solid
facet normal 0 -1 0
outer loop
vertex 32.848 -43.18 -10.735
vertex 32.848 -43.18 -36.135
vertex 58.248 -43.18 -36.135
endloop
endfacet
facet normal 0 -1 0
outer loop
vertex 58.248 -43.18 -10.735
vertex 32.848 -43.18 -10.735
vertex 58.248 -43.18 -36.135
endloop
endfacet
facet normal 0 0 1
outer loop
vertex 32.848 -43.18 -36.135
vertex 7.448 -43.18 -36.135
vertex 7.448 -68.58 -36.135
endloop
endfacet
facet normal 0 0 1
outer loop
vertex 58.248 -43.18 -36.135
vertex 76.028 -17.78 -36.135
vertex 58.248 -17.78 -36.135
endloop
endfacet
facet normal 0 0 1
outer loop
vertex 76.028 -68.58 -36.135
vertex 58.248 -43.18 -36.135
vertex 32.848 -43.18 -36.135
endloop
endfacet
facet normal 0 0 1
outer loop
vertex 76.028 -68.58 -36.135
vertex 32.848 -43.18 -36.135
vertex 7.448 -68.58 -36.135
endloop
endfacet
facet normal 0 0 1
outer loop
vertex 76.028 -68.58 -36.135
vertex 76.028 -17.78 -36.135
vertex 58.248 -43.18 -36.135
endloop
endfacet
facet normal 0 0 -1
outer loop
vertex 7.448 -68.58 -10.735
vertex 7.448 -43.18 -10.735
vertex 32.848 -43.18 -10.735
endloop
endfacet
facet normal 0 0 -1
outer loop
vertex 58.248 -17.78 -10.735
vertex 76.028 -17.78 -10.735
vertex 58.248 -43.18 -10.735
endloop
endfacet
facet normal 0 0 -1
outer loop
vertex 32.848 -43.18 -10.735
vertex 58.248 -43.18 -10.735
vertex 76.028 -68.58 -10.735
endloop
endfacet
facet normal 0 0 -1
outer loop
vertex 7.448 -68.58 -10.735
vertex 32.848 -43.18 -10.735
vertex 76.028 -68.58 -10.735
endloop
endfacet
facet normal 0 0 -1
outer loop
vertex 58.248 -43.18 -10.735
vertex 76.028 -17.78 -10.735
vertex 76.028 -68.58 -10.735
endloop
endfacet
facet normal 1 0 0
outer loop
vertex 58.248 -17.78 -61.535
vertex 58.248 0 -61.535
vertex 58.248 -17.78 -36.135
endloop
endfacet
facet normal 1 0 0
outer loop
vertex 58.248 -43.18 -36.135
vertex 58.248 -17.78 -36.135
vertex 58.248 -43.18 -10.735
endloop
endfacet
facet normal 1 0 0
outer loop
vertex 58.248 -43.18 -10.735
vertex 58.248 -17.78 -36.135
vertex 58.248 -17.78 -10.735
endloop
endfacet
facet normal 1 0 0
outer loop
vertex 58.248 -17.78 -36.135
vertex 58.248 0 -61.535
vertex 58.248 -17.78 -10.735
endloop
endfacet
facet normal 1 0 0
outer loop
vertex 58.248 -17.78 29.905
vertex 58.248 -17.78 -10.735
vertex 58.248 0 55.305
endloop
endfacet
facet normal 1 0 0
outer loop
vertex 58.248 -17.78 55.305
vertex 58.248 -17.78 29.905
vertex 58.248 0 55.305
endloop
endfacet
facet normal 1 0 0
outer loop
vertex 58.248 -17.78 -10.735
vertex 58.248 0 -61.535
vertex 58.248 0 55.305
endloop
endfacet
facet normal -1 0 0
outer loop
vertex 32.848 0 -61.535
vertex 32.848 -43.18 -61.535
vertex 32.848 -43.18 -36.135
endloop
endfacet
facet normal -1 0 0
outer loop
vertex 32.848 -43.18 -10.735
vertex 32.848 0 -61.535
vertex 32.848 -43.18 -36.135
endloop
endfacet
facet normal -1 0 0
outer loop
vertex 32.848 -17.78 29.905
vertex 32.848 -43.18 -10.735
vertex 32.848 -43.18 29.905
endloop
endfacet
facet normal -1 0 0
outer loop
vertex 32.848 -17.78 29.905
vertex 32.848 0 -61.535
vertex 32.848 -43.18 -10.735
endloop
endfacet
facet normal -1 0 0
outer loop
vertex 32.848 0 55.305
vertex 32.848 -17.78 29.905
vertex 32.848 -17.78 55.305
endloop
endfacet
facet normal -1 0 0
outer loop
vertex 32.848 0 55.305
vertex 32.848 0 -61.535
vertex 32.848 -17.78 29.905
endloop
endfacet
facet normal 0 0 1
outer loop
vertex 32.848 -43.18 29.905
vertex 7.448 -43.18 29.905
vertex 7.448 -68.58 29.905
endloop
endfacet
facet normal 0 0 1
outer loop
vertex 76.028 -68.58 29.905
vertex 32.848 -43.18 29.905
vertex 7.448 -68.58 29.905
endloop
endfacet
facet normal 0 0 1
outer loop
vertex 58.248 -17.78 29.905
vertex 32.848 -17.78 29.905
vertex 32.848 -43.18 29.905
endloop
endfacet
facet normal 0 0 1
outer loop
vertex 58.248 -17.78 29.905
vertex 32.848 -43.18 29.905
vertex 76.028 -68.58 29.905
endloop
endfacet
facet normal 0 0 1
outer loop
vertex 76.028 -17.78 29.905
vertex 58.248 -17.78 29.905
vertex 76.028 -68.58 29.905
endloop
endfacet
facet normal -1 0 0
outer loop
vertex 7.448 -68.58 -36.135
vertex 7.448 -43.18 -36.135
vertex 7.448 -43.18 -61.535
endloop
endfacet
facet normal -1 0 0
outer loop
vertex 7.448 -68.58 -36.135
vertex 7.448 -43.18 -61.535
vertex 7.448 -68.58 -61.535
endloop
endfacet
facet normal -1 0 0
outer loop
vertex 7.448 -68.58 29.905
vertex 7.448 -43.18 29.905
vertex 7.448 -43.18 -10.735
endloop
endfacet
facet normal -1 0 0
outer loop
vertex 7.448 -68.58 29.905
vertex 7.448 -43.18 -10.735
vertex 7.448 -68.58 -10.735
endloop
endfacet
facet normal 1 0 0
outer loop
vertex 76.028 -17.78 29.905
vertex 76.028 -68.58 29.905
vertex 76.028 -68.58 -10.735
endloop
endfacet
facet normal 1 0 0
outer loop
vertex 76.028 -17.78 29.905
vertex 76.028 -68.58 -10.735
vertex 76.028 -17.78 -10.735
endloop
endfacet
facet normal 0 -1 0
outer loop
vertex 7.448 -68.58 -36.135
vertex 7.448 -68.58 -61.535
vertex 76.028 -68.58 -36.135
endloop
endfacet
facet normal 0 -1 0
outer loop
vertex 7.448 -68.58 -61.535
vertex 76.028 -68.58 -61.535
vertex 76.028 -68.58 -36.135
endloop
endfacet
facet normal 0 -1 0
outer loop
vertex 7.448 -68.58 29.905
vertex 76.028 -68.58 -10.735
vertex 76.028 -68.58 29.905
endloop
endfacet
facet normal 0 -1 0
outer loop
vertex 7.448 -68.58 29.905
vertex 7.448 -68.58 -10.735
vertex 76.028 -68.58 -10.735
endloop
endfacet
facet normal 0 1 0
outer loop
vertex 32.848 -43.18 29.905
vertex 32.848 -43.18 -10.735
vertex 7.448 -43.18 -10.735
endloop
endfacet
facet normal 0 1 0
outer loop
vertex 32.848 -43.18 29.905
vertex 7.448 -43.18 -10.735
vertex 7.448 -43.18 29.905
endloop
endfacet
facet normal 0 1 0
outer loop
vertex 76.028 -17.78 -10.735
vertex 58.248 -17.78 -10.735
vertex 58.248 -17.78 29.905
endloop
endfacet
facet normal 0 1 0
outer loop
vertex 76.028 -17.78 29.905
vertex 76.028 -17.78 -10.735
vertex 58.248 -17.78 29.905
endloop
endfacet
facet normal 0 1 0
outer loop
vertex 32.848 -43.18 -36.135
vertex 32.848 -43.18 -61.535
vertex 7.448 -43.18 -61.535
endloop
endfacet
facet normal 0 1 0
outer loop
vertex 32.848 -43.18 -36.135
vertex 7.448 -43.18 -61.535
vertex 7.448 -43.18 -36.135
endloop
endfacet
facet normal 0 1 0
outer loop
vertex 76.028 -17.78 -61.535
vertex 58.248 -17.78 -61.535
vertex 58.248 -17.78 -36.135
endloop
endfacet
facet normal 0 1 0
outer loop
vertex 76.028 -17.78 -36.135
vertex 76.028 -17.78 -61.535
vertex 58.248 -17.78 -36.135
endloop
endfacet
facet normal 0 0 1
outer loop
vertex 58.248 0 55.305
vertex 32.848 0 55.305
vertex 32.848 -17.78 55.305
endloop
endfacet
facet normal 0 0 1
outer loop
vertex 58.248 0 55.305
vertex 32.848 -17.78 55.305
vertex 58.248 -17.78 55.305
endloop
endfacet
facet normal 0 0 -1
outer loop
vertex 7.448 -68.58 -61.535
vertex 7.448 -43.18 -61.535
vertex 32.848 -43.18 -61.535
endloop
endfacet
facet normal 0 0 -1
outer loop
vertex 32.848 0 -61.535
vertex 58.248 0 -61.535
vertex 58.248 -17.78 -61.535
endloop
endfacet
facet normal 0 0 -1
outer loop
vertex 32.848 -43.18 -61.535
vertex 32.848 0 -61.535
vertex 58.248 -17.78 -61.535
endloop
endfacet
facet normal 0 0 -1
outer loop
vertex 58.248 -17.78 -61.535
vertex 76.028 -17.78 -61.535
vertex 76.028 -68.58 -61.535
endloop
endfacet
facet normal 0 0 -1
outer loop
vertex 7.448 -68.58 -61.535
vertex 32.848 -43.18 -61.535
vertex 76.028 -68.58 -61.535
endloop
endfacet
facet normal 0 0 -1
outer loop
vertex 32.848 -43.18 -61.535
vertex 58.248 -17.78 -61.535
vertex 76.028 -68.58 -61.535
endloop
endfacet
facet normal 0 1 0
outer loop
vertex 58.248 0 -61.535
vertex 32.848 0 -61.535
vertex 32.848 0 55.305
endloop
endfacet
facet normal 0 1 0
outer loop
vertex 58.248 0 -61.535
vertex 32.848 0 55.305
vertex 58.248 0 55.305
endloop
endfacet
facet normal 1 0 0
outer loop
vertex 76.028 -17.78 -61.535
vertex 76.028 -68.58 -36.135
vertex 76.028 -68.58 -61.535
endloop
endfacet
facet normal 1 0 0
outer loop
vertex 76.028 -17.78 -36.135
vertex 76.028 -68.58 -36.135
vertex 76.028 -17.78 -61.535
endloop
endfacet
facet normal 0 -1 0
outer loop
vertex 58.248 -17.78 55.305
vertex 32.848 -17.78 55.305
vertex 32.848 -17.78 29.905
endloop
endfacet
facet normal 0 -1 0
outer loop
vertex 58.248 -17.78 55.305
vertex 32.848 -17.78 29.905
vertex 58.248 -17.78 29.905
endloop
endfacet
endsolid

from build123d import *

# Parameters (mm, degrees)
F0_W     = 25.4
F0_H     = 25.4
F1_DEPTH = 17.78
F0_H_2   = 91.44
F2_DEPTH = 68.58
F3_W     = 50.8
F3_H     = 25.4
F3_H_2   = 40.64
F4_DEPTH = 17.78
F5_W     = 25.4
F5_H     = 25.4
F6_DEPTH = 25.4
F7_W     = 25.4
F7_H     = 25.4
F7_H_2   = 40.64
F8_DEPTH = 25.4


with BuildPart() as f1:
    # F0 (on Front) → F1 (new body)
    with BuildSketch(Plane.XZ):
        with Locations((45.547863, 42.605166)):
            Rectangle(F0_W, F0_H)
    extrude(amount=F1_DEPTH)

    # F0 (on Front) → F2 (join)
    with BuildSketch(Plane.XZ):
        with Locations((45.547863, -15.814834)):
            Rectangle(F0_W, F0_H_2)
    extrude(amount=F2_DEPTH)

    # F3 (on face) → F4 (join)
    with BuildSketch(Plane.YZ.offset(58.247863)):
        with Locations((-43.18, -48.834834)):
            Rectangle(F3_W, F3_H)
        with Locations((-43.18, 9.585166)):
            Rectangle(F3_W, F3_H_2)
    extrude(amount=F4_DEPTH)

    # F5 (on face) → F6 (cut)
    with BuildSketch(Plane.XZ.offset(68.58)):
        with Locations((45.547863, -23.434834)):
            Rectangle(F5_W, F5_H)
    extrude(amount=-F6_DEPTH, mode=Mode.SUBTRACT)

    # F7 (on face) → F8 (join)
    with BuildSketch(Plane(origin=(32.847863, 0, 0), x_dir=(0, -1, 0), z_dir=(-1, 0, 0))):
        with Locations((55.88, -48.834834)):
            Rectangle(F7_W, F7_H)
        with Locations((55.88, 9.585166)):
            Rectangle(F7_W, F7_H_2)
    extrude(amount=F8_DEPTH)


solid = f1.part
